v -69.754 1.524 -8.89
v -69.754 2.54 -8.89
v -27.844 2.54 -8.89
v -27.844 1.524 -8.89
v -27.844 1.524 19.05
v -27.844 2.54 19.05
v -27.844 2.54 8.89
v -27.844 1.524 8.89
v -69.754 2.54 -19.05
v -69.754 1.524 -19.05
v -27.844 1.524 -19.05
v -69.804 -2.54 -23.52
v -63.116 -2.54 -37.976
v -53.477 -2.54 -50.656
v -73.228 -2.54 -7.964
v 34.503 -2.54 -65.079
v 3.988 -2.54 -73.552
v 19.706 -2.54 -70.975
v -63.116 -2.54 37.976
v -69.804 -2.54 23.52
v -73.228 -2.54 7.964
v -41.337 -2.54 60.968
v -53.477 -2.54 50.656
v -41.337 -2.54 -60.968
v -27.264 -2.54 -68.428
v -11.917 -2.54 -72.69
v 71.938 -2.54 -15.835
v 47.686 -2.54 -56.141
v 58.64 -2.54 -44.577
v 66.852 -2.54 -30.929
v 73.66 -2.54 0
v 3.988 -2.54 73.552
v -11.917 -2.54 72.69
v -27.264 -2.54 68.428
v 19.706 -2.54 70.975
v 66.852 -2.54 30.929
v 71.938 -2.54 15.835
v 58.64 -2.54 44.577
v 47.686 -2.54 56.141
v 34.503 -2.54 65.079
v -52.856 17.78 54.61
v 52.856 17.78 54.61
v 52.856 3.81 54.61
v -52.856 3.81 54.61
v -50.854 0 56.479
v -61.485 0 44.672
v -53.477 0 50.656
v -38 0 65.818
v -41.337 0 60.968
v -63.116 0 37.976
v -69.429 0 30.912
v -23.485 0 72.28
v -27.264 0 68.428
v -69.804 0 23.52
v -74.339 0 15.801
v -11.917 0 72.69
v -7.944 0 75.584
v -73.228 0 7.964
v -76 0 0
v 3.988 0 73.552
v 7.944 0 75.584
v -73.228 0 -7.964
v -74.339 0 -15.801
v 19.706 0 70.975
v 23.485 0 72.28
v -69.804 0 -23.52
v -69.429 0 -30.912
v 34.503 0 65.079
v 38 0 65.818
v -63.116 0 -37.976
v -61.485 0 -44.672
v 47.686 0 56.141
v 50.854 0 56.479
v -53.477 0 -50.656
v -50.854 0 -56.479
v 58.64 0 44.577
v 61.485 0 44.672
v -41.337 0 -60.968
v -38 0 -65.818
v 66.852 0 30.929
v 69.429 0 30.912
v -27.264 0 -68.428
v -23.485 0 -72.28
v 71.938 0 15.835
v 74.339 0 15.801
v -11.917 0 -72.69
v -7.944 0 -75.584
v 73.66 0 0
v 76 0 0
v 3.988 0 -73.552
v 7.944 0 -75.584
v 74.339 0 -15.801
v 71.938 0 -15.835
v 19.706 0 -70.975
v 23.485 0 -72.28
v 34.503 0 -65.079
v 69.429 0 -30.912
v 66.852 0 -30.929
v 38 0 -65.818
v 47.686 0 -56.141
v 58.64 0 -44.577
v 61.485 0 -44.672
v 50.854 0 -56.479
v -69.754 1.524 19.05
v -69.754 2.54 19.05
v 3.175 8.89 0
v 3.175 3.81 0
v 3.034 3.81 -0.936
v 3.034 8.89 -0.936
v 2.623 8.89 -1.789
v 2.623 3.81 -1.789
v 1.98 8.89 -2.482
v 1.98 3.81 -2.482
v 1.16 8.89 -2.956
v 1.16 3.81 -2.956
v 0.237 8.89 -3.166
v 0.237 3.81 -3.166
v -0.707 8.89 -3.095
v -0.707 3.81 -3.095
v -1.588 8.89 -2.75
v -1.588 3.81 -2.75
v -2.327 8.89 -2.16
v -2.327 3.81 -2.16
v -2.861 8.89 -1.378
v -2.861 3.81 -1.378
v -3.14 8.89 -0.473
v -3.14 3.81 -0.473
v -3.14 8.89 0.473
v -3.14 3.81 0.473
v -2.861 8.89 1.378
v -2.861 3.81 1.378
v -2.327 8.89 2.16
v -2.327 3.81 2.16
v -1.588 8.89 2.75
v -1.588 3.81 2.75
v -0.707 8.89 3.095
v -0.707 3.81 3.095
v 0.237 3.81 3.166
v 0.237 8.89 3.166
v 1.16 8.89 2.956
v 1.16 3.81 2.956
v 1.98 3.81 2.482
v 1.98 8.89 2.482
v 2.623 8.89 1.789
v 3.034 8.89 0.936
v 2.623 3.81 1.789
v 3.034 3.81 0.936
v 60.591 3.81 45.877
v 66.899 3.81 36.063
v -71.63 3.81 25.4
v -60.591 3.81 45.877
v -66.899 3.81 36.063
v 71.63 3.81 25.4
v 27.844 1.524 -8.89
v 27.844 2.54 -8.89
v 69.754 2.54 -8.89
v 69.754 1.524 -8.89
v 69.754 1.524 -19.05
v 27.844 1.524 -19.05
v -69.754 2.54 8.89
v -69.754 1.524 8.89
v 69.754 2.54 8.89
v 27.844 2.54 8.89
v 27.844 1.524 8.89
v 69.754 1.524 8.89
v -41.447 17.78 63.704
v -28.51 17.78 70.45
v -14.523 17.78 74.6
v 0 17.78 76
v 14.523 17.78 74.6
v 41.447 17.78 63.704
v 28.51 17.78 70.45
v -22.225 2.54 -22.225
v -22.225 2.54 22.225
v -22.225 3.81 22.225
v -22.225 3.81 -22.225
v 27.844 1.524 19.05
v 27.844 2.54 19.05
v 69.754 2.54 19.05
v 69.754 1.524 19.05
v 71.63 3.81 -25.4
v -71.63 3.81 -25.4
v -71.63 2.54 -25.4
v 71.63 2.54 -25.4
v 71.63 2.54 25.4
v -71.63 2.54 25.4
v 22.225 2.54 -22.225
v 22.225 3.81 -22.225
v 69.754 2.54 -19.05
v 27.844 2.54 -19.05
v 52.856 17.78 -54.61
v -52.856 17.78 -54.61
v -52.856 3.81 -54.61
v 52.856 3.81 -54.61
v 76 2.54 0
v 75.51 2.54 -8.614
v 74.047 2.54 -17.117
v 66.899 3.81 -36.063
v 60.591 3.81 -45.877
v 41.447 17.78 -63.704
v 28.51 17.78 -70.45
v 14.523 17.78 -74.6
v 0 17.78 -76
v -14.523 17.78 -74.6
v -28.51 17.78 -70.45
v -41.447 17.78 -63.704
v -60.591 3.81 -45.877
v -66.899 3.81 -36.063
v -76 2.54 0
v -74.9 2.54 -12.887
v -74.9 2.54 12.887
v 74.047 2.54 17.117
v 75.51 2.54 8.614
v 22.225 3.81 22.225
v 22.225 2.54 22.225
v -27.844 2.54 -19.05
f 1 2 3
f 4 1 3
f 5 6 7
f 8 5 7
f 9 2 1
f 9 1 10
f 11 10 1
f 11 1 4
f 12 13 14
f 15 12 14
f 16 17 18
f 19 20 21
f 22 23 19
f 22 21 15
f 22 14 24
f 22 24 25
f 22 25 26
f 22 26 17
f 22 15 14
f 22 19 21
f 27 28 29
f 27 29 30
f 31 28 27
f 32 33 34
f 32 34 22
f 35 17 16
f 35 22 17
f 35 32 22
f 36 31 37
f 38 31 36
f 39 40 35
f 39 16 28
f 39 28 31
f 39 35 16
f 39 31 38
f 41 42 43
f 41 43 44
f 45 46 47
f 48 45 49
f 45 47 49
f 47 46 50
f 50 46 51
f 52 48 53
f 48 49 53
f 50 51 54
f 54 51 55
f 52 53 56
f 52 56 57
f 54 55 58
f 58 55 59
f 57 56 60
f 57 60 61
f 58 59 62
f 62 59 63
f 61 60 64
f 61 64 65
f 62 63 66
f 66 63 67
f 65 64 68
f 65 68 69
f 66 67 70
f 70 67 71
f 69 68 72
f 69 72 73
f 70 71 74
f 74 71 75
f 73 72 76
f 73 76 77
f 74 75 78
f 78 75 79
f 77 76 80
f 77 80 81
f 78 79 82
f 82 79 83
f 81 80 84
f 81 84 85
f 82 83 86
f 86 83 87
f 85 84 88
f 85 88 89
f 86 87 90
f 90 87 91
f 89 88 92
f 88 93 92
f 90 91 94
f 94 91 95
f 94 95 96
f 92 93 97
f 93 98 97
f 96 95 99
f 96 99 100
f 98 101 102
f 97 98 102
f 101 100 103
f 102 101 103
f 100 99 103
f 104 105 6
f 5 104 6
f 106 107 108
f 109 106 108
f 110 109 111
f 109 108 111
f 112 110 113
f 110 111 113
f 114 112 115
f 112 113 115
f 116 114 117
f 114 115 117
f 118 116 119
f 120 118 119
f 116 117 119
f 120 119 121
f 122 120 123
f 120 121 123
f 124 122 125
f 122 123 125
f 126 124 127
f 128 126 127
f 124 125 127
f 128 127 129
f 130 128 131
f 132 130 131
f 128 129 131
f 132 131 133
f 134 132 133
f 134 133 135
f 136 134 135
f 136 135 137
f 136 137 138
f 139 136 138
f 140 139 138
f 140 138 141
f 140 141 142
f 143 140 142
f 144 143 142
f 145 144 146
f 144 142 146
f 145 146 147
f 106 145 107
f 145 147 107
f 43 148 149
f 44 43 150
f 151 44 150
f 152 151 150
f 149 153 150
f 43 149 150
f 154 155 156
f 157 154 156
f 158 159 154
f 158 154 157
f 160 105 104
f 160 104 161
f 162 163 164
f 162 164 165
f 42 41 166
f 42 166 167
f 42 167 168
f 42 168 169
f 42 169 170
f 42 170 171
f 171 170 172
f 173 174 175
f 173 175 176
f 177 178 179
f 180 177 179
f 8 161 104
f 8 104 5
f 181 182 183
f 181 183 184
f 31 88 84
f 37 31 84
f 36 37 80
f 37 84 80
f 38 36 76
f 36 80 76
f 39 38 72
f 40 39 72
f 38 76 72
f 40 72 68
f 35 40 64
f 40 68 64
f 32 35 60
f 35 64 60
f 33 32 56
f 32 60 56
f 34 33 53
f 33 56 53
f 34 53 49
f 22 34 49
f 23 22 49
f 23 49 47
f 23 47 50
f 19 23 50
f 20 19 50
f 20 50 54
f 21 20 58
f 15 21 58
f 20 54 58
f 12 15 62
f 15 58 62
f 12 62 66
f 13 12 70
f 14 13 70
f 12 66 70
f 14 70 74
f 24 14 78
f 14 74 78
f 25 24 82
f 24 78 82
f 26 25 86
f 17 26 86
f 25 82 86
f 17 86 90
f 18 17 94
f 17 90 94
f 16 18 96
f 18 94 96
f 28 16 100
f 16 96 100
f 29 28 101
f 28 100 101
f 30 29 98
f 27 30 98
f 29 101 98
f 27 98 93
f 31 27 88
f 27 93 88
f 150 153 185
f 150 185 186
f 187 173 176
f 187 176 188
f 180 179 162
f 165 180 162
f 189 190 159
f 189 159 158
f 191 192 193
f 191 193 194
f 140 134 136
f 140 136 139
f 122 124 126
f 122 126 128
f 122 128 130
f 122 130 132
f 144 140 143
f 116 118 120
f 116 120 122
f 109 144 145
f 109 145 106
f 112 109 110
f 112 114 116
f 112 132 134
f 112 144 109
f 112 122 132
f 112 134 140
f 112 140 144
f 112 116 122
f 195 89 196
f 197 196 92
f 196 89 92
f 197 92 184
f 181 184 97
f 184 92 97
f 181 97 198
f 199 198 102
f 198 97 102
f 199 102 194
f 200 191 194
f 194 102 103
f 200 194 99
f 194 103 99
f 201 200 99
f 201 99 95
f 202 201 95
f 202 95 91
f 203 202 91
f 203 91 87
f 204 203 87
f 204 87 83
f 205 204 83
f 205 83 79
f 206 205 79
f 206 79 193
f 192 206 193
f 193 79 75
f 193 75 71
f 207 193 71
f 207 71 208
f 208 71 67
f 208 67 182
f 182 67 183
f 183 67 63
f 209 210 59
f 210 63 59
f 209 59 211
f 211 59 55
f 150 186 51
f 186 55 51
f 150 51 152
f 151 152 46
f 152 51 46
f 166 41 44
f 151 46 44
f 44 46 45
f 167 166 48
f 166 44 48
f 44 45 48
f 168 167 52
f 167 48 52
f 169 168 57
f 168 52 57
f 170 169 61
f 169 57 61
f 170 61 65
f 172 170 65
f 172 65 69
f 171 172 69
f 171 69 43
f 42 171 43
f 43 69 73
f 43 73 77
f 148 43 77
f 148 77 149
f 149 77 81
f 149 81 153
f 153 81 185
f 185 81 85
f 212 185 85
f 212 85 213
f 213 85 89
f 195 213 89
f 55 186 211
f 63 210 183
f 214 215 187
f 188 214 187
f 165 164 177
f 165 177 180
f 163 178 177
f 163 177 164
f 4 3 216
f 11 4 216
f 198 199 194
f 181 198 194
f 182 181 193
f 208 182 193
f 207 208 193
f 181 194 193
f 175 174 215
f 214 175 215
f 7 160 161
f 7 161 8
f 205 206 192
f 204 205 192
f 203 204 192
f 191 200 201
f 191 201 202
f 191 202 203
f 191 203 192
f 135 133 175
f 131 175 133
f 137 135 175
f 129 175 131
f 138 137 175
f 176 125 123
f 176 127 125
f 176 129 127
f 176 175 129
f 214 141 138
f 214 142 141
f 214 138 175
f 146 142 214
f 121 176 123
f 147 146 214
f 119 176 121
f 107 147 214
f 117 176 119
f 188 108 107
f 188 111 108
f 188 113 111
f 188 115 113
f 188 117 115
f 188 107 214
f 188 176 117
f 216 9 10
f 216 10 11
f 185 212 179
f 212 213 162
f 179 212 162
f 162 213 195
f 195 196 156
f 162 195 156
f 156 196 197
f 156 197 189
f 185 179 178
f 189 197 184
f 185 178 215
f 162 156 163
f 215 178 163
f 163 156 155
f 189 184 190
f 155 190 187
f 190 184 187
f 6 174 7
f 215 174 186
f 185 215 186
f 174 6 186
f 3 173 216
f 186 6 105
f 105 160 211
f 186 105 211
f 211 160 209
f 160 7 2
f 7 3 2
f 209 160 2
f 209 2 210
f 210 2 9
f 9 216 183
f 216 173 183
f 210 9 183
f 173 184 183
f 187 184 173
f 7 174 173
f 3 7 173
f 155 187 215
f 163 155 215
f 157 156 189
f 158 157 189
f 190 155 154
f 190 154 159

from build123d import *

# Parameters (mm, degrees)
SKETCH2_R           = 76
BOSS_EXTRUDE1_DEPTH = 17.78
CUT_EXTRUDE3_DEPTH  = 13.97
CUT_EXTRUDE5_DEPTH  = 1.27
SKETCH10_W          = 41.91
SKETCH10_H          = 10.16
CUT_EXTRUDE6_DEPTH  = 1.016
SKETCH11_W          = 44.45
SKETCH11_H          = 44.45
BOSS_EXTRUDE2_DEPTH = 1.27
SKETCH14_R          = 3.175
BOSS_EXTRUDE4_DEPTH = 5.08
SKETCH15_R          = 73.66
BOSS_EXTRUDE5_DEPTH = 2.54


with BuildPart() as part:
    # Sketch2 → Boss-Extrude1 (new body)
    with BuildSketch(Plane(origin=(0, 0, 0), x_dir=(1, 0, 0), z_dir=(0, 1, 0))):
        Circle(SKETCH2_R)
    extrude(amount=BOSS_EXTRUDE1_DEPTH)

    # Sketch6 → Cut-Extrude3 (cut)
    with BuildSketch(Plane(origin=(0, 17.78, 0), x_dir=(1, 0, 0), z_dir=(0, 1, 0))):
        with BuildLine():
            Line((-76, 54.61), (76, 54.61))
            ThreePointArc((76, 54.61), (130.61, 0), (76, -54.61))
            Line((76, -54.61), (-76, -54.61))
            ThreePointArc((-76, -54.61), (-130.61, 0), (-76, 54.61))
        make_face()
    extrude(amount=-CUT_EXTRUDE3_DEPTH, mode=Mode.SUBTRACT)

    # Sketch9 → Cut-Extrude5 (cut)
    with BuildSketch(Plane(origin=(0, 3.81, 0), x_dir=(1, 0, 0), z_dir=(0, 1, 0))):
        with BuildLine():
            Line((-76, 25.4), (-25.4, 25.4))
            Line((-25.4, 25.4), (25.4, 25.4))
            Line((25.4, 25.4), (76, 25.4))
            ThreePointArc((76, 25.4), (101.4, 0), (76, -25.4))
            Line((76, -25.4), (25.4, -25.4))
            Line((25.4, -25.4), (-25.4, -25.4))
            Line((-25.4, -25.4), (-76, -25.4))
            ThreePointArc((-76, -25.4), (-101.4, 0), (-76, 25.4))
        make_face()
    extrude(amount=-CUT_EXTRUDE5_DEPTH, mode=Mode.SUBTRACT)

    # Sketch10 → Cut-Extrude6 (cut)
    with BuildSketch(Plane(origin=(0, 2.54, 0), x_dir=(1, 0, 0), z_dir=(0, 1, 0))):
        with Locations((-48.79885899, 13.97)):
            Rectangle(SKETCH10_W, SKETCH10_H)
        with Locations((-48.79885899, -13.97)):
            Rectangle(SKETCH10_W, SKETCH10_H)
        with Locations((48.79885899, -13.97)):
            Rectangle(SKETCH10_W, SKETCH10_H)
        with Locations((48.79885899, 13.97)):
            Rectangle(SKETCH10_W, SKETCH10_H)
    extrude(amount=-CUT_EXTRUDE6_DEPTH, mode=Mode.SUBTRACT)

    # Sketch11 → Boss-Extrude2 (add)
    with BuildSketch(Plane(origin=(0, 2.54, 0), x_dir=(1, 0, 0), z_dir=(0, 1, 0))):
        Rectangle(SKETCH11_W, SKETCH11_H)
    extrude(amount=BOSS_EXTRUDE2_DEPTH)

    # Sketch14 → Boss-Extrude4 (add)
    with BuildSketch(Plane(origin=(0, 3.81, 0), x_dir=(1, 0, 0), z_dir=(0, 1, 0))):
        Circle(SKETCH14_R)
    extrude(amount=BOSS_EXTRUDE4_DEPTH)

    # Sketch15 → Boss-Extrude5 (add)
    with BuildSketch(Plane.XZ):
        Circle(SKETCH15_R)
    extrude(amount=BOSS_EXTRUDE5_DEPTH)


solid = part.part
